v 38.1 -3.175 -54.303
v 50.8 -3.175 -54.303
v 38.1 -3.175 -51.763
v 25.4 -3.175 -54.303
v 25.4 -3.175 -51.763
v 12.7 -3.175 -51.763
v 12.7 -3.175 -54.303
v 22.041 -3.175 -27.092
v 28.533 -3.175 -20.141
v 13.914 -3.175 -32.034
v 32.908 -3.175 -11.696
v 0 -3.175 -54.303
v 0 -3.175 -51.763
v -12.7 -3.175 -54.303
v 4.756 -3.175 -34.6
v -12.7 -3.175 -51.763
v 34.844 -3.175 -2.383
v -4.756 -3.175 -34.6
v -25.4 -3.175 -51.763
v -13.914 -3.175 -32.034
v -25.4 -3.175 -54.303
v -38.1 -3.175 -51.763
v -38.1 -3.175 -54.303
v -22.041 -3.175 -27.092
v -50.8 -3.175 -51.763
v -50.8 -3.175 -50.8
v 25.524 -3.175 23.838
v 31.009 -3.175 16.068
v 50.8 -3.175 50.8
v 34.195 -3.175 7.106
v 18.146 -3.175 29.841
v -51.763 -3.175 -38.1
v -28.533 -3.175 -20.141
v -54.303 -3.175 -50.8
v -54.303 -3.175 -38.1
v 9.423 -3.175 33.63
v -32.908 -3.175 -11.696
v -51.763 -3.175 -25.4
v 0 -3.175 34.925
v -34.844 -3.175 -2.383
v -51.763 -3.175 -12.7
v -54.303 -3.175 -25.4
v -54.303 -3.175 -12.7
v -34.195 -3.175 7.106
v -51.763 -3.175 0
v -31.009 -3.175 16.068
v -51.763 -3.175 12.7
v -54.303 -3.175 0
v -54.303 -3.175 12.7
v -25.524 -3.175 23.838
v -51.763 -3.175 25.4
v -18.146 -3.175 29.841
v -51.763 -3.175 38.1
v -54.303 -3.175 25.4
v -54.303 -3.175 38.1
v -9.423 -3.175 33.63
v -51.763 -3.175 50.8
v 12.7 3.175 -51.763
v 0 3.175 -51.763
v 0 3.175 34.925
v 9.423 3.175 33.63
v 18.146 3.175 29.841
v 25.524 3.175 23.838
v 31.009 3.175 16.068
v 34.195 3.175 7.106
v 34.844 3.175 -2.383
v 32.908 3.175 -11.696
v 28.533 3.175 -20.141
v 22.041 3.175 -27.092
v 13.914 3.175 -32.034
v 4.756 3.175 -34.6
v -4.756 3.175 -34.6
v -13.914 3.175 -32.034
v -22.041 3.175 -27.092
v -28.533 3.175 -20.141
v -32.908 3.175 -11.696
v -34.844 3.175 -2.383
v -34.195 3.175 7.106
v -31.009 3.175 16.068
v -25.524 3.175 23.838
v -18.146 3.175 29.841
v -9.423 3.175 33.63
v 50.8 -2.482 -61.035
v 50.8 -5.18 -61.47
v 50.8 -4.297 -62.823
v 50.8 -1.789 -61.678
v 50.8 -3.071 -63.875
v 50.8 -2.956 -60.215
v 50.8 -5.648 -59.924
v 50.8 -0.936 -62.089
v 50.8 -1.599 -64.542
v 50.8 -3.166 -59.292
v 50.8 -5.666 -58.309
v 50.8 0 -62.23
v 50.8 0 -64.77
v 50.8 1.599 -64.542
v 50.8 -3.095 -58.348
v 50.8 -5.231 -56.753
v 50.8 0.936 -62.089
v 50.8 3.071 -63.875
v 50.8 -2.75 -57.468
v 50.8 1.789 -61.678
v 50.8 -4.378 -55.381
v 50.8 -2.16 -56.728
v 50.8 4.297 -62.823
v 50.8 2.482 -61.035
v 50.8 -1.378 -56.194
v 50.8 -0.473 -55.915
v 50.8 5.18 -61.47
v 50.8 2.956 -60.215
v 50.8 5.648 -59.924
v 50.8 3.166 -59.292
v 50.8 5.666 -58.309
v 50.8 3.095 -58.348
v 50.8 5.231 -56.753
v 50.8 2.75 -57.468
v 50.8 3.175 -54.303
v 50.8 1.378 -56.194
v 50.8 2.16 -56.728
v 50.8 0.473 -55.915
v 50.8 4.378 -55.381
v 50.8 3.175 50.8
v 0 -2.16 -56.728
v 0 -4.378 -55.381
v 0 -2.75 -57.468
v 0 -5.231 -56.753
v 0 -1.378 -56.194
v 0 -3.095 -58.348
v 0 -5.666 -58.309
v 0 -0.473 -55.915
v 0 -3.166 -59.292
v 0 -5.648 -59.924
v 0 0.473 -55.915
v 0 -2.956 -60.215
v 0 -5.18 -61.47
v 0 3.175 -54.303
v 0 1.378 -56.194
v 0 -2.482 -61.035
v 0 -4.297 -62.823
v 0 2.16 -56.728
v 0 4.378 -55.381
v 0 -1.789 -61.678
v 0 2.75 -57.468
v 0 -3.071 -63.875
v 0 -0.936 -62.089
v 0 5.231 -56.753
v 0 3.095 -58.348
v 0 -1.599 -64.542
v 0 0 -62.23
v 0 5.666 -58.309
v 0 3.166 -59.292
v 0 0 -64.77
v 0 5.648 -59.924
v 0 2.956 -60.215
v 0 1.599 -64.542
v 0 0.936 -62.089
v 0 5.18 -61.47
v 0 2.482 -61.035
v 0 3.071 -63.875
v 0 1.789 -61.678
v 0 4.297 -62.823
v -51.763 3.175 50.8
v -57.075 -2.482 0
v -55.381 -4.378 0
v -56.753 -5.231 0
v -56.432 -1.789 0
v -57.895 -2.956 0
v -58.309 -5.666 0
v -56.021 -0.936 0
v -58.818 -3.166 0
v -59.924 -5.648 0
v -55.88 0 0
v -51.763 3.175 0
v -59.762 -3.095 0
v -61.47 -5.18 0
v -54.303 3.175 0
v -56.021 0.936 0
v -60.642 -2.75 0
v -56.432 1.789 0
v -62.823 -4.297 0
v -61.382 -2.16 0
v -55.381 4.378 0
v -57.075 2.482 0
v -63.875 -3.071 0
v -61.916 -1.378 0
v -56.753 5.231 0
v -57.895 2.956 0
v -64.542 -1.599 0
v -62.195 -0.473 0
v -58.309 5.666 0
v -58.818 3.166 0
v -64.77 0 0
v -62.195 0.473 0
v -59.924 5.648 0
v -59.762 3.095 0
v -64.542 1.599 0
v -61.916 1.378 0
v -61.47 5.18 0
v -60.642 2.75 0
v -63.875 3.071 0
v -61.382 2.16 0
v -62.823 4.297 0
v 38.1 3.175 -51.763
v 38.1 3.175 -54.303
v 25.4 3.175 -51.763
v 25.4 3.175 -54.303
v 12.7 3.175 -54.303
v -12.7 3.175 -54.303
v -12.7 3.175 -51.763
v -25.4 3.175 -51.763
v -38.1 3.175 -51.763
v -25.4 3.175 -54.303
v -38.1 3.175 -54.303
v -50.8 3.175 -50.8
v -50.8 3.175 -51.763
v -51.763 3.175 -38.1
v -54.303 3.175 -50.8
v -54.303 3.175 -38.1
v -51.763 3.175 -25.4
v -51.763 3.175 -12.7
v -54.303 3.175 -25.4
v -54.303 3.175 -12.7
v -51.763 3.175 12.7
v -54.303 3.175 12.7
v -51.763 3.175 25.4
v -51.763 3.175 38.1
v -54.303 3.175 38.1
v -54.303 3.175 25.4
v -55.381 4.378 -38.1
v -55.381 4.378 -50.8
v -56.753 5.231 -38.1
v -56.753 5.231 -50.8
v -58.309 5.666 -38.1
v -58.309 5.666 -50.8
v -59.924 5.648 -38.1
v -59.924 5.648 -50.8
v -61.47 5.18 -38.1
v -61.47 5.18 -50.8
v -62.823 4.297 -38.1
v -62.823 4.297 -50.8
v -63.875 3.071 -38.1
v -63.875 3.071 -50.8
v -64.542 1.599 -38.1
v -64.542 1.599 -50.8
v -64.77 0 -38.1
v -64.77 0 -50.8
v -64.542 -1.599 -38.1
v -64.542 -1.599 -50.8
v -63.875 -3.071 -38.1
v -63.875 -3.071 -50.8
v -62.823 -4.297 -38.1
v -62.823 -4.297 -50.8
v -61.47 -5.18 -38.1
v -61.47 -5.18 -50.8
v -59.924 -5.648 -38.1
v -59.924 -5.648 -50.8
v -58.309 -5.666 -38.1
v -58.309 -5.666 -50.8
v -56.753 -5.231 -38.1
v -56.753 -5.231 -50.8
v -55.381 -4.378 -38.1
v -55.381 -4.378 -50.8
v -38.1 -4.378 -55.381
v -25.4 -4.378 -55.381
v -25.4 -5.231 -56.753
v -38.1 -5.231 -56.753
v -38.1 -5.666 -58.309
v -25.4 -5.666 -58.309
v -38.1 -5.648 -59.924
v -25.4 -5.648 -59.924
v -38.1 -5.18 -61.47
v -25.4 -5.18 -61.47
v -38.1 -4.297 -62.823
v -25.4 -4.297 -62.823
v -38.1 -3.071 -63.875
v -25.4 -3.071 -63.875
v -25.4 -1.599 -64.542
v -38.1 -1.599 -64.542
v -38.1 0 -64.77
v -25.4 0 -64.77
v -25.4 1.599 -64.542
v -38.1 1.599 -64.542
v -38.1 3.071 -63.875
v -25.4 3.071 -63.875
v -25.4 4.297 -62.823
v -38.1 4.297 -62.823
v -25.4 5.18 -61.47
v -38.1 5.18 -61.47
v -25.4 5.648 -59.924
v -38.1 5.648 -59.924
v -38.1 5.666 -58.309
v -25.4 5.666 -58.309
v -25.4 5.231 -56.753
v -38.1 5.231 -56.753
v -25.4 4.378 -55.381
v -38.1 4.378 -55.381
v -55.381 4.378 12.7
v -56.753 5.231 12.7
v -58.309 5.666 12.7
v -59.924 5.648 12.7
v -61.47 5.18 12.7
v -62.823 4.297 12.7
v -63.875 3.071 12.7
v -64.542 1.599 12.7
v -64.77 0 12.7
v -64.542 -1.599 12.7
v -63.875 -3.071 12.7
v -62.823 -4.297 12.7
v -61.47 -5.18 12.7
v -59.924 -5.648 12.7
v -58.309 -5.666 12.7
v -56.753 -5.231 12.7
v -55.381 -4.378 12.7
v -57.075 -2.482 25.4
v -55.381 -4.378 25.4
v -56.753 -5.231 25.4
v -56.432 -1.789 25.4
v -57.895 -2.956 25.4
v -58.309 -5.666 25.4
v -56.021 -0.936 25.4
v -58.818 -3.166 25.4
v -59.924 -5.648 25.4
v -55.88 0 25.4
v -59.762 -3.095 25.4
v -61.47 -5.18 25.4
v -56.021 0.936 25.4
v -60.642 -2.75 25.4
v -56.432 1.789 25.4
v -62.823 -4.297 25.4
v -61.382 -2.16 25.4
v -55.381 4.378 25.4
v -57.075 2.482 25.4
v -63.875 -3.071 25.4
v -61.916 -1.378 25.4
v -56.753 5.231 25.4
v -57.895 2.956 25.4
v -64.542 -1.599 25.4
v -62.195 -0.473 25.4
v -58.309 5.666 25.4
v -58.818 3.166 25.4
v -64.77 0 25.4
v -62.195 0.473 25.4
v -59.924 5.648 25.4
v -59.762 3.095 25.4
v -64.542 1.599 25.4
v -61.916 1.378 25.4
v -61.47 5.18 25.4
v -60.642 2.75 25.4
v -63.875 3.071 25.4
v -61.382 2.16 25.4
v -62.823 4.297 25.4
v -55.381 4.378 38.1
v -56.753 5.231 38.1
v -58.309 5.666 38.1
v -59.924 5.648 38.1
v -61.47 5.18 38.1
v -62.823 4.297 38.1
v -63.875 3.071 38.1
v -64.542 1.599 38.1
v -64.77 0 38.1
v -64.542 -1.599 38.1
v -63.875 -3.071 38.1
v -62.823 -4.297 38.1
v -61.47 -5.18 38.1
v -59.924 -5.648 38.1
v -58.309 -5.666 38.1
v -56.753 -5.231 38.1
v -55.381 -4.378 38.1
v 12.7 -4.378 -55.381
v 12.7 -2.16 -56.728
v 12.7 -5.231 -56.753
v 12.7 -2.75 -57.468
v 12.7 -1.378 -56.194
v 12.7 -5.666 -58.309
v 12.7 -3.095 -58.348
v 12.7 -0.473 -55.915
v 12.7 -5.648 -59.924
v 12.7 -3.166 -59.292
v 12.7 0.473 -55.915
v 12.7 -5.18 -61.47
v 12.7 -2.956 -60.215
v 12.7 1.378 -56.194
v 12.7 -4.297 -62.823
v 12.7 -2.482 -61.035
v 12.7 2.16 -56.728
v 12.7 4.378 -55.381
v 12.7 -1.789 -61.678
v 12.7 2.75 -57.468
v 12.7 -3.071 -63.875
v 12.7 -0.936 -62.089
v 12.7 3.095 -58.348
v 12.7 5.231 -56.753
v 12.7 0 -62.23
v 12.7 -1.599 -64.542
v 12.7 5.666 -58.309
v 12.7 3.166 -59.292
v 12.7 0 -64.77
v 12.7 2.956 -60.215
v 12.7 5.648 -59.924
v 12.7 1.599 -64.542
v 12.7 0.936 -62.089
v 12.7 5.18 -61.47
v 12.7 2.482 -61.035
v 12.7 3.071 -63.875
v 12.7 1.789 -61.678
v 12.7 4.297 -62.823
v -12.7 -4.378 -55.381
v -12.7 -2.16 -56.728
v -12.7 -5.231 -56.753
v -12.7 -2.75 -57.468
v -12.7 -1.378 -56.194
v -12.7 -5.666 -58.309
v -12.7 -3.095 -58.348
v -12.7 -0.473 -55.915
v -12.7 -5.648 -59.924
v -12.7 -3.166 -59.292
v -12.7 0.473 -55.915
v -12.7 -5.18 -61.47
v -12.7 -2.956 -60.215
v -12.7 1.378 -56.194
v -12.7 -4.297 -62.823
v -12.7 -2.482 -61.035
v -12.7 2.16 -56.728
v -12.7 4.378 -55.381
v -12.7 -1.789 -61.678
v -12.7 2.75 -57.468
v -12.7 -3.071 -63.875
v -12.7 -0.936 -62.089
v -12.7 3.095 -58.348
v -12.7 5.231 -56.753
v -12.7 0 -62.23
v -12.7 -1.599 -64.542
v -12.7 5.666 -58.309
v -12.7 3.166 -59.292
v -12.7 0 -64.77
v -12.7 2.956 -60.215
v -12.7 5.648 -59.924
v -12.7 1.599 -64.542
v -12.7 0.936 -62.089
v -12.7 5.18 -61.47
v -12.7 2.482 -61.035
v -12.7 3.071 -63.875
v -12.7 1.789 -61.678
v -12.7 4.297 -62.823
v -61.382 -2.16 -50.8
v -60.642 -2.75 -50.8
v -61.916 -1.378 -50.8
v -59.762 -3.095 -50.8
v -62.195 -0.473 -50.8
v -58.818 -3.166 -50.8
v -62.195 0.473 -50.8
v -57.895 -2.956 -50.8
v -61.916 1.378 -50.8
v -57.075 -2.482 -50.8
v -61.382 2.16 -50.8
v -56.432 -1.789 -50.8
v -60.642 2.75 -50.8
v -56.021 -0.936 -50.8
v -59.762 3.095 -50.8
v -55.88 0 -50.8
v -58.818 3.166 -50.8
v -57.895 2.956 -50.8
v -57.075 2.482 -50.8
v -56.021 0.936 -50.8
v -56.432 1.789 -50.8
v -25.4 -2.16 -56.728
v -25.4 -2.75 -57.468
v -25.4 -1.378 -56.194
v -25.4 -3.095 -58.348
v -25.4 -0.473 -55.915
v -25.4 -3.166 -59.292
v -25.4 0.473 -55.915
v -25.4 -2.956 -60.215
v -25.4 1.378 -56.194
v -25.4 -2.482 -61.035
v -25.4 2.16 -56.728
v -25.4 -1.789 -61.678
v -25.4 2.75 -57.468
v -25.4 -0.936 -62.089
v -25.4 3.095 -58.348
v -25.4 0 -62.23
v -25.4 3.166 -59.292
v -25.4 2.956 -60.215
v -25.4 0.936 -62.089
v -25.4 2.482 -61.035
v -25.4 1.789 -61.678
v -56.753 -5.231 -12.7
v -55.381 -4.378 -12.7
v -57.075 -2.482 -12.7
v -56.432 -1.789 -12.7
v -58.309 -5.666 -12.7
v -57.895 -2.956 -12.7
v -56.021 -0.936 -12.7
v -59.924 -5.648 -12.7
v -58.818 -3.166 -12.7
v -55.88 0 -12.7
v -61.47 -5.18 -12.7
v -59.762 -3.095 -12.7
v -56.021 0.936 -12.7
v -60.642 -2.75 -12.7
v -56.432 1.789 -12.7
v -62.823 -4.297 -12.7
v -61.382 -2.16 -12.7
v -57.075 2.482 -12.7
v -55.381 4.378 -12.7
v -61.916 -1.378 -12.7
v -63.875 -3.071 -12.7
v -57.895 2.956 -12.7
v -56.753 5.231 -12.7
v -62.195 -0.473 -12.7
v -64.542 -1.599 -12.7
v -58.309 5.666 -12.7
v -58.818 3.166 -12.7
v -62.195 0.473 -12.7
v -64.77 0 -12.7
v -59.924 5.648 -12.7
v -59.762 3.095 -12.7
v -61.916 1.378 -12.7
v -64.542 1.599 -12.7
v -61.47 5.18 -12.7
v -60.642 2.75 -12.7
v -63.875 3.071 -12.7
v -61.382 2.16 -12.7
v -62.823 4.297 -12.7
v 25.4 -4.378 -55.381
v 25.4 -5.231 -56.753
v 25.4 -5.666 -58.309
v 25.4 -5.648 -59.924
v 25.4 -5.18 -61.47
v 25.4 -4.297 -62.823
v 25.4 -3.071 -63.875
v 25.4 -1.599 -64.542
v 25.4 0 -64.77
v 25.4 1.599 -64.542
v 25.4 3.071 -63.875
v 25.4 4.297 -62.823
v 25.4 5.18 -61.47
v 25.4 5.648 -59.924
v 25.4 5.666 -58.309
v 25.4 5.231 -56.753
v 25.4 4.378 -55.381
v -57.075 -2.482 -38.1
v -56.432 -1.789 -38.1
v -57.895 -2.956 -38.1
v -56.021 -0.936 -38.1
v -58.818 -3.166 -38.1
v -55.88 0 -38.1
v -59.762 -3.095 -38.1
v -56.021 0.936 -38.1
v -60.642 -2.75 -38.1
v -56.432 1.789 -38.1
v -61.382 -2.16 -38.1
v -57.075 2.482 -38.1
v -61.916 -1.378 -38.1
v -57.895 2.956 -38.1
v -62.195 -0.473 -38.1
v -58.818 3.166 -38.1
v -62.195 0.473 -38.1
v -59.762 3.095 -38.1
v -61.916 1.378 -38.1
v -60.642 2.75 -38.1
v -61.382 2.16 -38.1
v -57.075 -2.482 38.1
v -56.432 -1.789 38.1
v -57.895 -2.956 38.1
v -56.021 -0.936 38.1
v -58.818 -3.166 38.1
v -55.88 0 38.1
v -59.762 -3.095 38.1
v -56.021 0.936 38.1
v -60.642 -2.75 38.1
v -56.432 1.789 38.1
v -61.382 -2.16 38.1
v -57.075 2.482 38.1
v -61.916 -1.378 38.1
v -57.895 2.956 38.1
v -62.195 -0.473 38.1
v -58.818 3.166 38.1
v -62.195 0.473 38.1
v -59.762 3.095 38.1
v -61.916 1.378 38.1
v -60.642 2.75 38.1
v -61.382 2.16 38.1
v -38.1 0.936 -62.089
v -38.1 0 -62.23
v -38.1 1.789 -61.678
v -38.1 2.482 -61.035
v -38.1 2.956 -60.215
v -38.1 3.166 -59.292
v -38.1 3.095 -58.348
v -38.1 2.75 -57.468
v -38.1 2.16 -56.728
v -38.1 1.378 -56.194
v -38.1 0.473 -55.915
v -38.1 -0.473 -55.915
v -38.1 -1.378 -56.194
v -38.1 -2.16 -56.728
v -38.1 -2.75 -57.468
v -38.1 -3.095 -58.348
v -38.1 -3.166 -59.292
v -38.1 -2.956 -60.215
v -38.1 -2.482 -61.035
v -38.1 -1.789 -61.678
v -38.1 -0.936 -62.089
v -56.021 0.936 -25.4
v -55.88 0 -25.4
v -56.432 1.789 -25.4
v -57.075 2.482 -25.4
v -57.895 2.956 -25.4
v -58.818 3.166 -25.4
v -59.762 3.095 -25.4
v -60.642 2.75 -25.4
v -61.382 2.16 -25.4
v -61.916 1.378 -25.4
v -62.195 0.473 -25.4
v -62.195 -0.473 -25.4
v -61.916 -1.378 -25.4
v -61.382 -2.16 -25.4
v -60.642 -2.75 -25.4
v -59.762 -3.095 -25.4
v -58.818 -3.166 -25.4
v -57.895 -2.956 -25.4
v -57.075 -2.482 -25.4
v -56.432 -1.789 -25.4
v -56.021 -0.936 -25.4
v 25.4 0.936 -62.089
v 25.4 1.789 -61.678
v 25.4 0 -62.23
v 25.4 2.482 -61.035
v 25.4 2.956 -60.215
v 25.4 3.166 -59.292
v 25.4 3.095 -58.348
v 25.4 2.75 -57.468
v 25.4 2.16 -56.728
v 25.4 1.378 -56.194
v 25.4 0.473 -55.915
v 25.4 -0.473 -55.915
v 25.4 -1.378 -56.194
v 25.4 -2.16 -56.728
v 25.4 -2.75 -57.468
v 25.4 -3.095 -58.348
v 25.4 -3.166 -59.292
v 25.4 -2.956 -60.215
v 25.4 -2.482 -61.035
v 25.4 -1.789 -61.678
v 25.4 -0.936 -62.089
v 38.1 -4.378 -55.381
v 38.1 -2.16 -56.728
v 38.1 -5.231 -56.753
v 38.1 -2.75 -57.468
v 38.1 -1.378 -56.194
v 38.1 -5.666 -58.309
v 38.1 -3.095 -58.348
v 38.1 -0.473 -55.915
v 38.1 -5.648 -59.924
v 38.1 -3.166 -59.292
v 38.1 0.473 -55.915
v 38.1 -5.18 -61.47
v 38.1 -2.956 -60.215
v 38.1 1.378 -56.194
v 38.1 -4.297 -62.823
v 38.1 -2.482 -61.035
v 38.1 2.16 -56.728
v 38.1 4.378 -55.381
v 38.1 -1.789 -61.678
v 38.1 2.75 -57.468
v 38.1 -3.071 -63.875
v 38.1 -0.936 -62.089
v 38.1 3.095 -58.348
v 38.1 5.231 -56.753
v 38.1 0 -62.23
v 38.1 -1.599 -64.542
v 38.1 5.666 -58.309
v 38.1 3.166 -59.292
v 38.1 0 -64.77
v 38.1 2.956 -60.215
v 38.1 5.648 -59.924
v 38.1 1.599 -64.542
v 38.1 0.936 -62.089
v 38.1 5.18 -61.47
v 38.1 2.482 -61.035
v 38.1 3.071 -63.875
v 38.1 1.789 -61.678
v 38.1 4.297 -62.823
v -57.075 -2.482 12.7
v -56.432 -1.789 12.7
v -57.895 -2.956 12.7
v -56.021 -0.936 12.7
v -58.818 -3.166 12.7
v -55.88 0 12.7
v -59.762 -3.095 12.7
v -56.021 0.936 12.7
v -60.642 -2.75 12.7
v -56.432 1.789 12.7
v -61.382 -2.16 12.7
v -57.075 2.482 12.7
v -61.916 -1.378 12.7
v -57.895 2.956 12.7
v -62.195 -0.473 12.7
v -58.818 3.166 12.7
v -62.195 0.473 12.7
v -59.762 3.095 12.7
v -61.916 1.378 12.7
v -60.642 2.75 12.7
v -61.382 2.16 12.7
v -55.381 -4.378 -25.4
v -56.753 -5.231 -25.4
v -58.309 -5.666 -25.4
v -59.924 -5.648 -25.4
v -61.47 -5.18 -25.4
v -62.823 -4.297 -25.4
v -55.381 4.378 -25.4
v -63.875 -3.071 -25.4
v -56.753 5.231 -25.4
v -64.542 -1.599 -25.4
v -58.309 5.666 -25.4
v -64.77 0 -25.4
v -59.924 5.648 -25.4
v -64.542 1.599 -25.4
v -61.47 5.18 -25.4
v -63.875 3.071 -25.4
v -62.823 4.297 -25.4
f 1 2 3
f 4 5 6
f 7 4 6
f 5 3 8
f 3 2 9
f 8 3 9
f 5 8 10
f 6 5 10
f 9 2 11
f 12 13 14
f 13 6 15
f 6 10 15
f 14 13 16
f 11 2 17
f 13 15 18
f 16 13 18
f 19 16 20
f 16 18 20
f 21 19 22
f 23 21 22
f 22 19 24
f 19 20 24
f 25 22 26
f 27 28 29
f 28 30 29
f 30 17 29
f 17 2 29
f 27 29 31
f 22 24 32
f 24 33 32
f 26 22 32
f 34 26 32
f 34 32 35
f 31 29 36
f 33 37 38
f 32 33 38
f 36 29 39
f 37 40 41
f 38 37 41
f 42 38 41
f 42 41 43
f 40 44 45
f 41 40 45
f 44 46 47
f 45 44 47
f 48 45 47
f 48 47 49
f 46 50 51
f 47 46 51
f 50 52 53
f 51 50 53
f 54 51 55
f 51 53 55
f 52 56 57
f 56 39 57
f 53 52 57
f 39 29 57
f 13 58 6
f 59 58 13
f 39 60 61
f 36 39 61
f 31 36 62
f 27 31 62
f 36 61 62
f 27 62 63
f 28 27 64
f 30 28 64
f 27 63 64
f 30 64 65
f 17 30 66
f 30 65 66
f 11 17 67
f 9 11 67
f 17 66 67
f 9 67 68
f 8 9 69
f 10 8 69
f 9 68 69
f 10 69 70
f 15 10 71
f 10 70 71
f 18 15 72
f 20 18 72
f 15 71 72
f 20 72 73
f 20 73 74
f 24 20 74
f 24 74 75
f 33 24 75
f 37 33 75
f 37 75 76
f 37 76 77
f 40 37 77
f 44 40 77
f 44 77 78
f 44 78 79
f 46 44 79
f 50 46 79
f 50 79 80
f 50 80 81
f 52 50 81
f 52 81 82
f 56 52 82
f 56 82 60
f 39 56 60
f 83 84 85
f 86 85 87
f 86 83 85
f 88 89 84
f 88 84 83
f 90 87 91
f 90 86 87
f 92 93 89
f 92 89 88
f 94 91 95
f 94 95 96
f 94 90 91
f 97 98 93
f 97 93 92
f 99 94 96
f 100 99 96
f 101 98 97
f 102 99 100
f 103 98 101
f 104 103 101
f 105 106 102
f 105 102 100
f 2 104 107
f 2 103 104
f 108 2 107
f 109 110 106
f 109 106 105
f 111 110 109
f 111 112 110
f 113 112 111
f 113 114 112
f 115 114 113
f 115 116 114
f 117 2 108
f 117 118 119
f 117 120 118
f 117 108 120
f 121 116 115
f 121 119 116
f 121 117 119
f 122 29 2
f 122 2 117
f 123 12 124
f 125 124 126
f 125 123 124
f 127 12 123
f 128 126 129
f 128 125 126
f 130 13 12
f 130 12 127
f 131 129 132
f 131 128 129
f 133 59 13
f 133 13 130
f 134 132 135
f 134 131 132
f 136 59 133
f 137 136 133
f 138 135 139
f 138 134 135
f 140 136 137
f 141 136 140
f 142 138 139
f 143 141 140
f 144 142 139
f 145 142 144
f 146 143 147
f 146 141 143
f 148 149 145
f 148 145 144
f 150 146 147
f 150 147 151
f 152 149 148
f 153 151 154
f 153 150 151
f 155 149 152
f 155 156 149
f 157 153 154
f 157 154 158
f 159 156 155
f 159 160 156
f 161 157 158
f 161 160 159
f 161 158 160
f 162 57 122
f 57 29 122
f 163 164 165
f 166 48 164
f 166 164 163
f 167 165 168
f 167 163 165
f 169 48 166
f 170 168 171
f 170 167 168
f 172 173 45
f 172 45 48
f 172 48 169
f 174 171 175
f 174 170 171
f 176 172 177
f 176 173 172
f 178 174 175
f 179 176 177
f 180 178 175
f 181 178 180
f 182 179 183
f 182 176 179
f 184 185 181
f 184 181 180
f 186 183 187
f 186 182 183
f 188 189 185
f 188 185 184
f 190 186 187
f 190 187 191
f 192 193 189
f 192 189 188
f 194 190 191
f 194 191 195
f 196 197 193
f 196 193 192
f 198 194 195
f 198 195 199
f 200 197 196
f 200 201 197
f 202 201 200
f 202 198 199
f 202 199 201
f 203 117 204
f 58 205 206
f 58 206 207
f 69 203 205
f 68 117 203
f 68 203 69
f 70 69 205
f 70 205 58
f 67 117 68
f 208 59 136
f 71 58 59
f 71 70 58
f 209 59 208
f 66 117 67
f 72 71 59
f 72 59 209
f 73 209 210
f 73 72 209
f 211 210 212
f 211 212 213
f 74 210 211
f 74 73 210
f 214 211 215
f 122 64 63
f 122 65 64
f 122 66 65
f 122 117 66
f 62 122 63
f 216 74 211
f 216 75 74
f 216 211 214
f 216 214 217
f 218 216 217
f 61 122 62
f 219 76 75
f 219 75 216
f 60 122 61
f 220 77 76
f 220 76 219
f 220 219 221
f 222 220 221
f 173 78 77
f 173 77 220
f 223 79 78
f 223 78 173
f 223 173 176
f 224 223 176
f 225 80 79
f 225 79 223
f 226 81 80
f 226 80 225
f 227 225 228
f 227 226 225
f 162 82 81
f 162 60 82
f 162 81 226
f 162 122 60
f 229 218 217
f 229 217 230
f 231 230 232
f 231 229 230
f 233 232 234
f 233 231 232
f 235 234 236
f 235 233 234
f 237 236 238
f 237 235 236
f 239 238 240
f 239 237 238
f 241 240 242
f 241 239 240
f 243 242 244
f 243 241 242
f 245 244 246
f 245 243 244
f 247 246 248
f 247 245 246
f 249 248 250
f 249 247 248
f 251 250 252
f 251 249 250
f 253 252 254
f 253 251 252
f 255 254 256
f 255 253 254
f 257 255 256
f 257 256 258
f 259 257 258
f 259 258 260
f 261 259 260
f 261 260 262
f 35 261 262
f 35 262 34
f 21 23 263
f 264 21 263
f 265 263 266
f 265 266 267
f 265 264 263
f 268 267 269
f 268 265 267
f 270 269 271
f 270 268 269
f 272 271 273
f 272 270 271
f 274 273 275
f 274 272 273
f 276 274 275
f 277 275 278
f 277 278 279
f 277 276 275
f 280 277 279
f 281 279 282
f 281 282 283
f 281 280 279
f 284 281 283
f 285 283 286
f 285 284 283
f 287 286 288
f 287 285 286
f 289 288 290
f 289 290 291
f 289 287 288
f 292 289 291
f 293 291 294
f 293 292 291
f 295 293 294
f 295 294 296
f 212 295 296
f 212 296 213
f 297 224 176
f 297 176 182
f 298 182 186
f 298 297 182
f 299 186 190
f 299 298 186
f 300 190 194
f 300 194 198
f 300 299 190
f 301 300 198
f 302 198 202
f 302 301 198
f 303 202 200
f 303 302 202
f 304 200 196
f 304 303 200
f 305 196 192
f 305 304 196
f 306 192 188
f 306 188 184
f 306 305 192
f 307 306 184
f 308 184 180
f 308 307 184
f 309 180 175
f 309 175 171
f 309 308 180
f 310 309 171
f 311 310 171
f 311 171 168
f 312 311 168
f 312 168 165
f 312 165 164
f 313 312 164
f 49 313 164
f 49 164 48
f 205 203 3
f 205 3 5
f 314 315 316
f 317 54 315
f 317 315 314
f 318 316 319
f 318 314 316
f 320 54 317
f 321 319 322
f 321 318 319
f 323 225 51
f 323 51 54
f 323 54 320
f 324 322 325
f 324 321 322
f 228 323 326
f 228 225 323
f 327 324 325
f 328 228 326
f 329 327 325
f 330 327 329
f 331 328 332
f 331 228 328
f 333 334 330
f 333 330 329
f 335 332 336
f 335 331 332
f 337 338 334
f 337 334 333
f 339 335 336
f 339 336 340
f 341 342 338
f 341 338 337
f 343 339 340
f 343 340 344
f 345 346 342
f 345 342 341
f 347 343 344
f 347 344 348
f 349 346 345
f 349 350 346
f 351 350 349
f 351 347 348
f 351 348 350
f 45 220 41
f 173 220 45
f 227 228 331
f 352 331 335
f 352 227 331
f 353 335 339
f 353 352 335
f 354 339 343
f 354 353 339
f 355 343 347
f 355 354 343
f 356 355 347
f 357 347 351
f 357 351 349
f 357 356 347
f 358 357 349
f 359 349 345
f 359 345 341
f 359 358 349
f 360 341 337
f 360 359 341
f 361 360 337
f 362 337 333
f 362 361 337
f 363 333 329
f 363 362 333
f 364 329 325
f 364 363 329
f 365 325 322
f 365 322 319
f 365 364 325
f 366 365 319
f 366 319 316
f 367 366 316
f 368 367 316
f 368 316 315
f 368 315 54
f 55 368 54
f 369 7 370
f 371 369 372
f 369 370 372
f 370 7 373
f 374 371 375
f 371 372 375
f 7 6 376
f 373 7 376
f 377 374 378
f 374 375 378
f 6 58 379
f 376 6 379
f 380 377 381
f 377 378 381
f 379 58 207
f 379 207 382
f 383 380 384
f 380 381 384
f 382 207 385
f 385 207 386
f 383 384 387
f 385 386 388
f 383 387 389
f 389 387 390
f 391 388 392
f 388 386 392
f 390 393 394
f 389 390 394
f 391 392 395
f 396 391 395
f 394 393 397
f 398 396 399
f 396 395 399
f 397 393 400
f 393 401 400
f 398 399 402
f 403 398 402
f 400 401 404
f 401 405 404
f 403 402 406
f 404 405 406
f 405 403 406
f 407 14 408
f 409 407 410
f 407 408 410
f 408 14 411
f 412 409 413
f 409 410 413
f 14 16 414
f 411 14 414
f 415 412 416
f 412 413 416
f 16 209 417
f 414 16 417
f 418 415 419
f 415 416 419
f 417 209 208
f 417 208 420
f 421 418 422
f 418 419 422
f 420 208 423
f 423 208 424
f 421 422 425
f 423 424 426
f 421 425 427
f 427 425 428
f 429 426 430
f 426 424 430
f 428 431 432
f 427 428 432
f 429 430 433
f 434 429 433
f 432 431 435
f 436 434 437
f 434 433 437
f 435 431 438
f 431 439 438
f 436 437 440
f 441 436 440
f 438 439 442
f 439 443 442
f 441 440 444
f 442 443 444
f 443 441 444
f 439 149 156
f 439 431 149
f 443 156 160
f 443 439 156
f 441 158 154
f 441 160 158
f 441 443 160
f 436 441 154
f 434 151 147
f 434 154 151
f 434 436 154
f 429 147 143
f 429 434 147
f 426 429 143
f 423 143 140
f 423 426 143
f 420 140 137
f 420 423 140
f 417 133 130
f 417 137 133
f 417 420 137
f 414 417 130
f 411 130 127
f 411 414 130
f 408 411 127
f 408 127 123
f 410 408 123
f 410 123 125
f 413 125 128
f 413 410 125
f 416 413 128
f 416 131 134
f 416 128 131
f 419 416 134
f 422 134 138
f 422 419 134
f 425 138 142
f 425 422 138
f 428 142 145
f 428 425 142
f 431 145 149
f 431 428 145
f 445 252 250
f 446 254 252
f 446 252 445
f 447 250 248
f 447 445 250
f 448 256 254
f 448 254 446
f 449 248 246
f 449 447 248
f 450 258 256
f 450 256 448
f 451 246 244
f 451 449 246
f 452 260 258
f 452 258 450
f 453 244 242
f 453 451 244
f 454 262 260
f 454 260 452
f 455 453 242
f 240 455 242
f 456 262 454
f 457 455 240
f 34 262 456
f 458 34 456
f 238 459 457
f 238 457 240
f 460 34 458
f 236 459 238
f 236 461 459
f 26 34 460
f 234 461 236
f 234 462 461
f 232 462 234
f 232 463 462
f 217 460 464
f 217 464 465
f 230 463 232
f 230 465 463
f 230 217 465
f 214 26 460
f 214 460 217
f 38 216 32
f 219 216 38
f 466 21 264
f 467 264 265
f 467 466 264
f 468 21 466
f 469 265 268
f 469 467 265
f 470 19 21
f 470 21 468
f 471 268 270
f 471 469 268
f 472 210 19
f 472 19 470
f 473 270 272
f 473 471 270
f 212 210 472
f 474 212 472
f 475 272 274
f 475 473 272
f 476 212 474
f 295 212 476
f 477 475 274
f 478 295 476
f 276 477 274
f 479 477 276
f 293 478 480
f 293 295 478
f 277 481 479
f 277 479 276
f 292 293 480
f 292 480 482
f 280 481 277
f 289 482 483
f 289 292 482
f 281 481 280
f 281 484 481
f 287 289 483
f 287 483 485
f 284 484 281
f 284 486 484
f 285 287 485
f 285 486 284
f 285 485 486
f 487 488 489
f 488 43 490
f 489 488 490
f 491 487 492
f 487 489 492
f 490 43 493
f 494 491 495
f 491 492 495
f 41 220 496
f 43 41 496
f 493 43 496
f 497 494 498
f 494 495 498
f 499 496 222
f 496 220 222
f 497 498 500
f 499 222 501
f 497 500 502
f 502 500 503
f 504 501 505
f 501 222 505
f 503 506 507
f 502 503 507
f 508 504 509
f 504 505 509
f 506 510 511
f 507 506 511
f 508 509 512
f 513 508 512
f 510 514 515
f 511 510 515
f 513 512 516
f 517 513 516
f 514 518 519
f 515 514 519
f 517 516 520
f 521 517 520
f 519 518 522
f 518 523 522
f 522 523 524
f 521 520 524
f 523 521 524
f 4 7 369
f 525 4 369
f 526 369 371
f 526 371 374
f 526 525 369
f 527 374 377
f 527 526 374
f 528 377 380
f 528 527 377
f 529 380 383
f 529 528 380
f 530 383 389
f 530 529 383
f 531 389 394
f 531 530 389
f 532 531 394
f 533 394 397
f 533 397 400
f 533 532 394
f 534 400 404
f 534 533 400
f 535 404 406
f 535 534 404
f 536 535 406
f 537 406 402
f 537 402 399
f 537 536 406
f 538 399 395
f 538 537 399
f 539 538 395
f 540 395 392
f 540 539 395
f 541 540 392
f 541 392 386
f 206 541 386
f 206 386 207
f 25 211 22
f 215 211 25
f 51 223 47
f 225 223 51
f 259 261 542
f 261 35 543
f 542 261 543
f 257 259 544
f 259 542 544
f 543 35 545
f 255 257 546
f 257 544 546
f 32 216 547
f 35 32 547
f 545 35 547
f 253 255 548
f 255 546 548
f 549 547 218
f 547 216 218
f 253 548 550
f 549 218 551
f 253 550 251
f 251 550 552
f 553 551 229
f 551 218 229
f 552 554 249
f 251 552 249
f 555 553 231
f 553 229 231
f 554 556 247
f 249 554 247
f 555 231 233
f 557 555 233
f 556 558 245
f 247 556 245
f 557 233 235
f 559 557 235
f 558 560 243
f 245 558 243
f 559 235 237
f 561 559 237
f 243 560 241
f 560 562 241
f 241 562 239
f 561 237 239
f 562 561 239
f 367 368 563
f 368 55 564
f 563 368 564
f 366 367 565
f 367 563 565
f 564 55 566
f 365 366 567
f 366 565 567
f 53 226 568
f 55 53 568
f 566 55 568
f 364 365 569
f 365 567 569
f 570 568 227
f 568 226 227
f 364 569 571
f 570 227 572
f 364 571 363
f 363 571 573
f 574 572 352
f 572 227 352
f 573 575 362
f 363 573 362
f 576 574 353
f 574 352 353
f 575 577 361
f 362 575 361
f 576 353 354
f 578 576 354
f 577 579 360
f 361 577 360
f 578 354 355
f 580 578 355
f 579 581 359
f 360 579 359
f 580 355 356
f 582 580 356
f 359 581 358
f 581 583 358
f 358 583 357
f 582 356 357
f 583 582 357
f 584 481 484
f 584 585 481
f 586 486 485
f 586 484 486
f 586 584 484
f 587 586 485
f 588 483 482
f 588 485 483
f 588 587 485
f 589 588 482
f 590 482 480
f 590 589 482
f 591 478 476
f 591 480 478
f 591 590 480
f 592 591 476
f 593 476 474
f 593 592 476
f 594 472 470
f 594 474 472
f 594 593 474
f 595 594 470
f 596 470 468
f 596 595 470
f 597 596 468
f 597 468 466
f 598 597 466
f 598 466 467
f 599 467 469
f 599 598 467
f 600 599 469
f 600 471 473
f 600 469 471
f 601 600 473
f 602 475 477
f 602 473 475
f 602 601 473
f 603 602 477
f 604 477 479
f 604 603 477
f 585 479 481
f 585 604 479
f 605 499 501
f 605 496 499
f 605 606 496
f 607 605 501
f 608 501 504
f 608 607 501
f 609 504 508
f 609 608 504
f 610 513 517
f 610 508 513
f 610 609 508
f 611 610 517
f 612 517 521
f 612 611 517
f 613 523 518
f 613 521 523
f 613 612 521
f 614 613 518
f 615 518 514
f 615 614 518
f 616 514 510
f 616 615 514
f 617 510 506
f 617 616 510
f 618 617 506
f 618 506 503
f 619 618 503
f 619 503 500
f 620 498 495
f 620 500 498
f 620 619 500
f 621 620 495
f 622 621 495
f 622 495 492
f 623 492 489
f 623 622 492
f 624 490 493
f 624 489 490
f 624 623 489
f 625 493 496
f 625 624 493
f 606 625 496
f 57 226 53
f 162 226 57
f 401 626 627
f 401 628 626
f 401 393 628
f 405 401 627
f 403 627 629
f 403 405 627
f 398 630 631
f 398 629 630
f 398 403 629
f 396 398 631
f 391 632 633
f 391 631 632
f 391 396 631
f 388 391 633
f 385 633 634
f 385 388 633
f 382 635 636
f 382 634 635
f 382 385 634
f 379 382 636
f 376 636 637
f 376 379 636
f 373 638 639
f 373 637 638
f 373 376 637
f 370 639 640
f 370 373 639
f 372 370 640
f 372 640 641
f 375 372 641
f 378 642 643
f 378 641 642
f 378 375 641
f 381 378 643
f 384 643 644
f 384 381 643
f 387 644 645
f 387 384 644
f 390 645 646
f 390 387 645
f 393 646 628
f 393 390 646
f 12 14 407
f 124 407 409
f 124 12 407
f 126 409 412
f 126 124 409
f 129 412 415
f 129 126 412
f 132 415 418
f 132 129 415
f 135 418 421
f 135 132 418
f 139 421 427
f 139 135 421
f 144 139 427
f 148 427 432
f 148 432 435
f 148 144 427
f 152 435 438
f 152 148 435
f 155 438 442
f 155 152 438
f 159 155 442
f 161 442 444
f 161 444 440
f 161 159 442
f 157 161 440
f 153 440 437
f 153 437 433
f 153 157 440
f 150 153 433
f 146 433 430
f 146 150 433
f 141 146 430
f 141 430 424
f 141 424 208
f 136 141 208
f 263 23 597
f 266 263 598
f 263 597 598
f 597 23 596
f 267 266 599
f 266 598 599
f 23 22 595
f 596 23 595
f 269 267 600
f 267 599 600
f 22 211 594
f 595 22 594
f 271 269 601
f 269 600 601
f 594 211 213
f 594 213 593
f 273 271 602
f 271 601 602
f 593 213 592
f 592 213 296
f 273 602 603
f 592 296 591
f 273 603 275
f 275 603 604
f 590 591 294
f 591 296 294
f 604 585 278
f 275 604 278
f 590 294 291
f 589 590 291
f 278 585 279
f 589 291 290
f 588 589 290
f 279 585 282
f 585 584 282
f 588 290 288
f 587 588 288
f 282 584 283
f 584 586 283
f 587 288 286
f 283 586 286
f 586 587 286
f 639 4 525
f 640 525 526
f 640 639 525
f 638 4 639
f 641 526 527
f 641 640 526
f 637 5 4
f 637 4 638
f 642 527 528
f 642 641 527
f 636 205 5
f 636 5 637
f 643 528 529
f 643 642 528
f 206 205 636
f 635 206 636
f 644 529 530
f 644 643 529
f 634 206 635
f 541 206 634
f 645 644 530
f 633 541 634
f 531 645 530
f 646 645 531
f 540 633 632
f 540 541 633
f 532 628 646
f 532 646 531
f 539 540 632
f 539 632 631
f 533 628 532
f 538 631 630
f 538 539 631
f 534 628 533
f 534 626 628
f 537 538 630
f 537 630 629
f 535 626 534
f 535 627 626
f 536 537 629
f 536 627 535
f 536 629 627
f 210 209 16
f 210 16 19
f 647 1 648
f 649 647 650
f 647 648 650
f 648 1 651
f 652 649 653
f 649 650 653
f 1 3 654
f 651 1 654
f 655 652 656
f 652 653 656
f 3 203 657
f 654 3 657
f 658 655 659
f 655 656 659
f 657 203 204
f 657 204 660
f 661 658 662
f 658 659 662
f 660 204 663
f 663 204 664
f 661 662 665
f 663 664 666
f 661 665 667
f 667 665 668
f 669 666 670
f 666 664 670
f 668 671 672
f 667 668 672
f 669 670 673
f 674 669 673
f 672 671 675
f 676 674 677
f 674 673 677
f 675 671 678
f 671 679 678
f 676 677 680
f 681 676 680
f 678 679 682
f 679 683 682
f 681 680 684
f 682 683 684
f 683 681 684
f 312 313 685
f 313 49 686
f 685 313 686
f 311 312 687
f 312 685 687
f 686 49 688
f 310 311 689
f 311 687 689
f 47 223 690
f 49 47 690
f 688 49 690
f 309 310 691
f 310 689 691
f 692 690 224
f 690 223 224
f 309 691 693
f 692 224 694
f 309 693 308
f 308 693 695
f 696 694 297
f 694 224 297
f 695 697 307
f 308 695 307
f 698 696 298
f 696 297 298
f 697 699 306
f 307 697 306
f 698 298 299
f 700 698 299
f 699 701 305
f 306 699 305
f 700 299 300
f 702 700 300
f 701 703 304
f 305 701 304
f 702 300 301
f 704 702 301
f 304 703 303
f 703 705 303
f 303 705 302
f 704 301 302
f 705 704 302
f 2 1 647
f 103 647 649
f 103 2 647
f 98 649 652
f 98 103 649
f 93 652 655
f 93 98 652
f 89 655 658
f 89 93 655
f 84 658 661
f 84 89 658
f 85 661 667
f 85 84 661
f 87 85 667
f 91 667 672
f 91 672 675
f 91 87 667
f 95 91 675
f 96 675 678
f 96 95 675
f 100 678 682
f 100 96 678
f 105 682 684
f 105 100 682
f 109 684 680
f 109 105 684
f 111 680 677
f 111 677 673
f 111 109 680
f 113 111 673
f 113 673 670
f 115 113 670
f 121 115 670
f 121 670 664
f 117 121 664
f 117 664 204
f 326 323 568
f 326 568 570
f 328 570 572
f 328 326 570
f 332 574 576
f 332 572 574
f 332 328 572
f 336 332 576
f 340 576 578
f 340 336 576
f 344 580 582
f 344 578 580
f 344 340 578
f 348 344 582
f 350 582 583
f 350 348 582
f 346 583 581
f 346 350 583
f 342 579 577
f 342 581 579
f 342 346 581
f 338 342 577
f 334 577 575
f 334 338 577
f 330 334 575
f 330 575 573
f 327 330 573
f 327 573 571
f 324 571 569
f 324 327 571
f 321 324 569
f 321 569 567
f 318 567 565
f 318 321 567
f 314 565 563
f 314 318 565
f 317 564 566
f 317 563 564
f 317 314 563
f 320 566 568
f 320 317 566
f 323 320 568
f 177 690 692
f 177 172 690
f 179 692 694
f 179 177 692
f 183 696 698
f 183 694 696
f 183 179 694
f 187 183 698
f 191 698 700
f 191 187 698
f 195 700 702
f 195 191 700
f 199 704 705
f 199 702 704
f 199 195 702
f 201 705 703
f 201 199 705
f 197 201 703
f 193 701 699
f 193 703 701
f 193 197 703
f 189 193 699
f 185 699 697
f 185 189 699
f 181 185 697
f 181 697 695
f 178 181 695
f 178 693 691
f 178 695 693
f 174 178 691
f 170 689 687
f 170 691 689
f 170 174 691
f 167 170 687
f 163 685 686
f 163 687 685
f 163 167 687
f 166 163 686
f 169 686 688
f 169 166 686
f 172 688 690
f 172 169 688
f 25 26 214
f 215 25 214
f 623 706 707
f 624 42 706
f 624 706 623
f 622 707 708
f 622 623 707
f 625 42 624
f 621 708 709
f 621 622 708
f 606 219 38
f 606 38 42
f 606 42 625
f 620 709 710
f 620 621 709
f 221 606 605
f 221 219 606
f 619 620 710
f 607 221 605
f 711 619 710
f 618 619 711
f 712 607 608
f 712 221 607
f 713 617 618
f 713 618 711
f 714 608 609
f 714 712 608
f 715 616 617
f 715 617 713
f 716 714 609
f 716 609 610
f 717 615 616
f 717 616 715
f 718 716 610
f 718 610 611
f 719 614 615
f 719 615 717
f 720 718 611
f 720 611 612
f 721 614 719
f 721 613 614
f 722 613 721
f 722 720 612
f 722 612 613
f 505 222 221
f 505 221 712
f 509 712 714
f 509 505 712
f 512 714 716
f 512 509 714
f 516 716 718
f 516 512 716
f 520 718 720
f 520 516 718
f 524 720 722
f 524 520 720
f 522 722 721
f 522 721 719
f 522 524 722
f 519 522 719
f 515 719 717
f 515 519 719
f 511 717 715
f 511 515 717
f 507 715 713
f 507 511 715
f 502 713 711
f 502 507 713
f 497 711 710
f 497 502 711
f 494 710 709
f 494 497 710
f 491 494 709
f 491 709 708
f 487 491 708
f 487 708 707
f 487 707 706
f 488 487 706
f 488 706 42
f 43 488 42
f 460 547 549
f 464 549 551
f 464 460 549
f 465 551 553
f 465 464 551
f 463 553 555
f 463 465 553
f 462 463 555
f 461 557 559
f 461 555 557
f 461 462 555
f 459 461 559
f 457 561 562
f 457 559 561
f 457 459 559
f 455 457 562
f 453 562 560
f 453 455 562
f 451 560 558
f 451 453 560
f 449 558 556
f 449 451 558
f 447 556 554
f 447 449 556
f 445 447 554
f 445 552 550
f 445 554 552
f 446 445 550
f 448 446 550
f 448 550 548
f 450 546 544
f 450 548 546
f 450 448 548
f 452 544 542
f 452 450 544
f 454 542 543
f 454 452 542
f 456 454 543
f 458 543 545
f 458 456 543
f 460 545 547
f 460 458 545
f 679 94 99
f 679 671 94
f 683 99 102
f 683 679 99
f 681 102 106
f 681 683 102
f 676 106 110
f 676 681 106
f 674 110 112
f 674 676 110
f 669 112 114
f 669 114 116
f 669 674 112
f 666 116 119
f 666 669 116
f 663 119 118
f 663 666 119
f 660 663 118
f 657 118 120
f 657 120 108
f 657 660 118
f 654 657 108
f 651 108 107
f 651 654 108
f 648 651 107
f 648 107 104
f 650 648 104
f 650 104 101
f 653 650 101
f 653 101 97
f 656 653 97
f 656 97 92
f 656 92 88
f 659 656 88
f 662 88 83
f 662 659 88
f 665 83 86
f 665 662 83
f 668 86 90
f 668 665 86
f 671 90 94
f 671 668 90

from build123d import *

# Parameters (mm, degrees)
SKETCH1_W                                 = 101.6
SKETCH1_H                                 = 101.6
BASE_EXTRUDE_DEPTH                        = 3.175
SKETCH9_R                                 = 34.925
CENTER_HOLE_DEPTH                         = 29.575
SKETCH2_R                                 = 5.715
SKETCH2_R_2                               = 3.175
LEFT_HINGE_BASE_DEPTH                     = 50.8
LEFT_HINGE_BASE_DEPTH_BACK                = 50.8
SKETCH2_3_R                               = 3.175
LEFT_HINGE_CUT_DEPTH                      = 50.8
LEFT_HINGE_CUT_DEPTH_BACK                 = 50.8
SKETCH3_W                                 = 101.6
SKETCH3_H                                 = 6.35
LEFT_HINGE_EXTENSION_DEPTH                = 3.503095
SKETCH4_R                                 = 5.715
SKETCH4_R_2                               = 3.175
BACK_HINGE_BASE_DEPTH                     = 50.8
BACK_HINGE_BASE_DEPTH_BACK                = 50.8
SKETCH4_3_R                               = 3.175
BACK_HINGE_CUT_DEPTH                      = 50.8
BACK_HINGE_CUT_DEPTH_BACK                 = 50.8
SKETCH7_W                                 = 101.6
SKETCH7_H                                 = 6.35
BACK_HINGE_EXTENSION_DEPTH                = 3.503095
SKETCH8_W                                 = 13.006904881
SKETCH8_H                                 = 12.7
HINGE_CUT_LEFT_DEPTH                      = 32.115
HINGE_CUT_LEFT_LPATTERN_COUNT             = 4
HINGE_CUT_LEFT_LPATTERN_PITCH             = 25.4
HINGE_CUT_BACK_CIRPATTERN_COUNT           = 2
HINGE_CUT_BACK_CIRPATTERN_ANGLE           = 90
HINGE_CUT_BACK_CIRPATTERN_COPY_1_SKETCH_W = 13.006904881
HINGE_CUT_BACK_CIRPATTERN_COPY_1_SKETCH_H = 12.7
HINGE_CUT_BACK_CIRPATTERN_COPY_1_DEPTH    = 32.115
HINGE_CUT_BACK_CIRPATTERN_COPY_2_SKETCH_W = 13.006904881
HINGE_CUT_BACK_CIRPATTERN_COPY_2_SKETCH_H = 12.7
HINGE_CUT_BACK_CIRPATTERN_COPY_2_DEPTH    = 32.115
HINGE_CUT_BACK_CIRPATTERN_COPY_3_SKETCH_W = 13.006904881
HINGE_CUT_BACK_CIRPATTERN_COPY_3_SKETCH_H = 12.7
HINGE_CUT_BACK_CIRPATTERN_COPY_3_DEPTH    = 32.115
CIRPATTERN2_COPY_1_SKETCH_W               = 13.006904881
CIRPATTERN2_COPY_1_SKETCH_H               = 12.7
CIRPATTERN2_COPY_1_DEPTH                  = 32.115
CIRPATTERN2_COPY_2_SKETCH_W               = 13.006904881
CIRPATTERN2_COPY_2_SKETCH_H               = 12.7
CIRPATTERN2_COPY_2_DEPTH                  = 32.115
CIRPATTERN2_COPY_3_SKETCH_W               = 13.006904881
CIRPATTERN2_COPY_3_SKETCH_H               = 12.7
CIRPATTERN2_COPY_3_DEPTH                  = 32.115
CIRPATTERN2_COPY_4_SKETCH_W               = 13.006904881
CIRPATTERN2_COPY_4_SKETCH_H               = 12.7
CIRPATTERN2_COPY_4_DEPTH                  = 32.115


with BuildPart() as part:
    # Sketch1 → Base Extrude (new body, symmetric)
    with BuildSketch(Plane(origin=(0, 0, 0), x_dir=(1, 0, 0), z_dir=(0, 1, 0))):
        Rectangle(SKETCH1_W, SKETCH1_H)
    extrude(amount=BASE_EXTRUDE_DEPTH, both=True)

    # Sketch9 → Center Hole (cut, through all)
    with BuildSketch(Plane(origin=(0, 25.4, 0), x_dir=(-1, 0, 0), z_dir=(0, 1, 0))):
        with Locations(Location((0, 0, 0), (0, 0, 90))):  # turned: the seam where the file's is
            Circle(SKETCH9_R)
    extrude(amount=-CENTER_HOLE_DEPTH, mode=Mode.SUBTRACT)



with BuildPart() as body_2:
    # Sketch2 → Left Hinge Base (new body, two sides)
    with BuildSketch(Plane.XY) as left_hinge_base_sk:
        with Locations((-59.055, 0)):
            Circle(SKETCH2_R)
        with Locations((-59.055, 0)):
            Circle(SKETCH2_R_2, mode=Mode.SUBTRACT)
        with Locations((-59.055, 0)):
            Circle(SKETCH2_R_2)
    extrude(amount=LEFT_HINGE_BASE_DEPTH)
    extrude(left_hinge_base_sk.sketch, amount=-LEFT_HINGE_BASE_DEPTH_BACK)

    # Sketch2_3 → Left Hinge Cut (cut, two sides)
    with BuildSketch(Plane.XY) as left_hinge_cut_sk:
        with Locations((-59.055, 0)):
            Circle(SKETCH2_3_R)
    extrude(amount=LEFT_HINGE_CUT_DEPTH, mode=Mode.SUBTRACT)
    extrude(left_hinge_cut_sk.sketch, amount=-LEFT_HINGE_CUT_DEPTH_BACK, mode=Mode.SUBTRACT)


with BuildPart() as part_1:
    add(part.part)

    add(body_2.part)  # Left Hinge Extension merges body 2
    # Sketch3 → Left Hinge Extension (add)
    with BuildSketch(Plane.ZY.offset(50.8)):
        Rectangle(SKETCH3_W, SKETCH3_H)
    extrude(amount=LEFT_HINGE_EXTENSION_DEPTH)



with BuildPart() as body_2_2:
    # Sketch4 → Back Hinge Base (new body, two sides)
    with BuildSketch(Plane(origin=(0, 0, 0), x_dir=(0, 0, -1), z_dir=(1, 0, 0))) as back_hinge_base_sk:
        with Locations((59.055, 0)):
            Circle(SKETCH4_R)
        with Locations((59.055, 0)):
            Circle(SKETCH4_R_2, mode=Mode.SUBTRACT)
        with Locations((59.055, 0)):
            Circle(SKETCH4_R_2)
    extrude(amount=BACK_HINGE_BASE_DEPTH)
    extrude(back_hinge_base_sk.sketch, amount=-BACK_HINGE_BASE_DEPTH_BACK)

    # Sketch4_3 → Back Hinge Cut (cut, two sides)
    with BuildSketch(Plane(origin=(0, 0, 0), x_dir=(0, 0, -1), z_dir=(1, 0, 0))) as back_hinge_cut_sk:
        with Locations((59.055, 0)):
            Circle(SKETCH4_3_R)
    extrude(amount=BACK_HINGE_CUT_DEPTH, mode=Mode.SUBTRACT)
    extrude(back_hinge_cut_sk.sketch, amount=-BACK_HINGE_CUT_DEPTH_BACK, mode=Mode.SUBTRACT)


with BuildPart() as part_2:
    add(part_1.part)

    add(body_2_2.part)  # Back Hinge Extension merges body 2 2
    # Sketch7 → Back Hinge Extension (add)
    with BuildSketch(Plane(origin=(0, 0, -50.8), x_dir=(-1, 0, 0), z_dir=(0, 0, -1))):
        Rectangle(SKETCH7_W, SKETCH7_H)
    extrude(amount=BACK_HINGE_EXTENSION_DEPTH)

    # Sketch8 → Hinge Cut Left (cut, through all)
    with BuildSketch(Plane(origin=(0, 25.4, 0), x_dir=(-1, 0, 0), z_dir=(0, 1, 0))):
        with Locations((58.26654756, 44.45)):
            Rectangle(SKETCH8_W, SKETCH8_H)
    hinge_cut_left = extrude(amount=-HINGE_CUT_LEFT_DEPTH, mode=Mode.SUBTRACT)

    # Hinge Cut Left LPattern: Hinge Cut Left ×4
    with Locations(*[(0, 0, -i * HINGE_CUT_LEFT_LPATTERN_PITCH) for i in range(1, HINGE_CUT_LEFT_LPATTERN_COUNT)]):
        add(hinge_cut_left, mode=Mode.SUBTRACT)

    # Hinge Cut Back CirPattern: Hinge Cut Left ×2 about axis
    hinge_cut_back_cirpattern_axis = Axis((0, 0, 0), (0, -1, 0))
    for i in range(1, HINGE_CUT_BACK_CIRPATTERN_COUNT):
        add(hinge_cut_left.rotate(hinge_cut_back_cirpattern_axis, i * HINGE_CUT_BACK_CIRPATTERN_ANGLE / (HINGE_CUT_BACK_CIRPATTERN_COUNT - 1)), mode=Mode.SUBTRACT)

    # Hinge Cut Back CirPattern copy 1 sketch → Hinge Cut Back CirPattern copy 1 (cut, through all)
    with BuildSketch(Plane(origin=(25.4, 25.4, 0), x_dir=(0, 0, -1), z_dir=(0, 1, 0))):
        with Locations((58.26654756, 44.45)):
            Rectangle(HINGE_CUT_BACK_CIRPATTERN_COPY_1_SKETCH_W, HINGE_CUT_BACK_CIRPATTERN_COPY_1_SKETCH_H)
    extrude(amount=-HINGE_CUT_BACK_CIRPATTERN_COPY_1_DEPTH, mode=Mode.SUBTRACT)

    # Hinge Cut Back CirPattern copy 2 sketch → Hinge Cut Back CirPattern copy 2 (cut, through all)
    with BuildSketch(Plane(origin=(50.8, 25.4, 0), x_dir=(0, 0, -1), z_dir=(0, 1, 0))):
        with Locations((58.26654756, 44.45)):
            Rectangle(HINGE_CUT_BACK_CIRPATTERN_COPY_2_SKETCH_W, HINGE_CUT_BACK_CIRPATTERN_COPY_2_SKETCH_H)
    extrude(amount=-HINGE_CUT_BACK_CIRPATTERN_COPY_2_DEPTH, mode=Mode.SUBTRACT)

    # Hinge Cut Back CirPattern copy 3 sketch → Hinge Cut Back CirPattern copy 3 (cut, through all)
    with BuildSketch(Plane(origin=(76.2, 25.4, 0), x_dir=(0, 0, -1), z_dir=(0, 1, 0))):
        with Locations((58.26654756, 44.45)):
            Rectangle(HINGE_CUT_BACK_CIRPATTERN_COPY_3_SKETCH_W, HINGE_CUT_BACK_CIRPATTERN_COPY_3_SKETCH_H)
    extrude(amount=-HINGE_CUT_BACK_CIRPATTERN_COPY_3_DEPTH, mode=Mode.SUBTRACT)

    # CirPattern2 copy 1 sketch → CirPattern2 copy 1 (cut, through all)
    with BuildSketch(Plane(origin=(0, 25.4, 25.4), x_dir=(1, 0, 0), z_dir=(0, 1, 0))):
        with Locations((58.26654756, 44.45)):
            Rectangle(CIRPATTERN2_COPY_1_SKETCH_W, CIRPATTERN2_COPY_1_SKETCH_H)
    extrude(amount=-CIRPATTERN2_COPY_1_DEPTH, mode=Mode.SUBTRACT)

    # CirPattern2 copy 2 sketch → CirPattern2 copy 2 (cut, through all)
    with BuildSketch(Plane(origin=(0, 25.4, 50.8), x_dir=(1, 0, 0), z_dir=(0, 1, 0))):
        with Locations((58.26654756, 44.45)):
            Rectangle(CIRPATTERN2_COPY_2_SKETCH_W, CIRPATTERN2_COPY_2_SKETCH_H)
    extrude(amount=-CIRPATTERN2_COPY_2_DEPTH, mode=Mode.SUBTRACT)

    # CirPattern2 copy 3 sketch → CirPattern2 copy 3 (cut, through all)
    with BuildSketch(Plane(origin=(0, 25.4, 76.2), x_dir=(1, 0, 0), z_dir=(0, 1, 0))):
        with Locations((58.26654756, 44.45)):
            Rectangle(CIRPATTERN2_COPY_3_SKETCH_W, CIRPATTERN2_COPY_3_SKETCH_H)
    extrude(amount=-CIRPATTERN2_COPY_3_DEPTH, mode=Mode.SUBTRACT)

    # CirPattern2 copy 4 sketch → CirPattern2 copy 4 (cut, through all)
    with BuildSketch(Plane(origin=(0, 25.4, 0), x_dir=(1, 0, 0), z_dir=(0, 1, 0))):
        with Locations((58.26654756, 44.45)):
            Rectangle(CIRPATTERN2_COPY_4_SKETCH_W, CIRPATTERN2_COPY_4_SKETCH_H)
    extrude(amount=-CIRPATTERN2_COPY_4_DEPTH, mode=Mode.SUBTRACT)


solid = part_2.part
